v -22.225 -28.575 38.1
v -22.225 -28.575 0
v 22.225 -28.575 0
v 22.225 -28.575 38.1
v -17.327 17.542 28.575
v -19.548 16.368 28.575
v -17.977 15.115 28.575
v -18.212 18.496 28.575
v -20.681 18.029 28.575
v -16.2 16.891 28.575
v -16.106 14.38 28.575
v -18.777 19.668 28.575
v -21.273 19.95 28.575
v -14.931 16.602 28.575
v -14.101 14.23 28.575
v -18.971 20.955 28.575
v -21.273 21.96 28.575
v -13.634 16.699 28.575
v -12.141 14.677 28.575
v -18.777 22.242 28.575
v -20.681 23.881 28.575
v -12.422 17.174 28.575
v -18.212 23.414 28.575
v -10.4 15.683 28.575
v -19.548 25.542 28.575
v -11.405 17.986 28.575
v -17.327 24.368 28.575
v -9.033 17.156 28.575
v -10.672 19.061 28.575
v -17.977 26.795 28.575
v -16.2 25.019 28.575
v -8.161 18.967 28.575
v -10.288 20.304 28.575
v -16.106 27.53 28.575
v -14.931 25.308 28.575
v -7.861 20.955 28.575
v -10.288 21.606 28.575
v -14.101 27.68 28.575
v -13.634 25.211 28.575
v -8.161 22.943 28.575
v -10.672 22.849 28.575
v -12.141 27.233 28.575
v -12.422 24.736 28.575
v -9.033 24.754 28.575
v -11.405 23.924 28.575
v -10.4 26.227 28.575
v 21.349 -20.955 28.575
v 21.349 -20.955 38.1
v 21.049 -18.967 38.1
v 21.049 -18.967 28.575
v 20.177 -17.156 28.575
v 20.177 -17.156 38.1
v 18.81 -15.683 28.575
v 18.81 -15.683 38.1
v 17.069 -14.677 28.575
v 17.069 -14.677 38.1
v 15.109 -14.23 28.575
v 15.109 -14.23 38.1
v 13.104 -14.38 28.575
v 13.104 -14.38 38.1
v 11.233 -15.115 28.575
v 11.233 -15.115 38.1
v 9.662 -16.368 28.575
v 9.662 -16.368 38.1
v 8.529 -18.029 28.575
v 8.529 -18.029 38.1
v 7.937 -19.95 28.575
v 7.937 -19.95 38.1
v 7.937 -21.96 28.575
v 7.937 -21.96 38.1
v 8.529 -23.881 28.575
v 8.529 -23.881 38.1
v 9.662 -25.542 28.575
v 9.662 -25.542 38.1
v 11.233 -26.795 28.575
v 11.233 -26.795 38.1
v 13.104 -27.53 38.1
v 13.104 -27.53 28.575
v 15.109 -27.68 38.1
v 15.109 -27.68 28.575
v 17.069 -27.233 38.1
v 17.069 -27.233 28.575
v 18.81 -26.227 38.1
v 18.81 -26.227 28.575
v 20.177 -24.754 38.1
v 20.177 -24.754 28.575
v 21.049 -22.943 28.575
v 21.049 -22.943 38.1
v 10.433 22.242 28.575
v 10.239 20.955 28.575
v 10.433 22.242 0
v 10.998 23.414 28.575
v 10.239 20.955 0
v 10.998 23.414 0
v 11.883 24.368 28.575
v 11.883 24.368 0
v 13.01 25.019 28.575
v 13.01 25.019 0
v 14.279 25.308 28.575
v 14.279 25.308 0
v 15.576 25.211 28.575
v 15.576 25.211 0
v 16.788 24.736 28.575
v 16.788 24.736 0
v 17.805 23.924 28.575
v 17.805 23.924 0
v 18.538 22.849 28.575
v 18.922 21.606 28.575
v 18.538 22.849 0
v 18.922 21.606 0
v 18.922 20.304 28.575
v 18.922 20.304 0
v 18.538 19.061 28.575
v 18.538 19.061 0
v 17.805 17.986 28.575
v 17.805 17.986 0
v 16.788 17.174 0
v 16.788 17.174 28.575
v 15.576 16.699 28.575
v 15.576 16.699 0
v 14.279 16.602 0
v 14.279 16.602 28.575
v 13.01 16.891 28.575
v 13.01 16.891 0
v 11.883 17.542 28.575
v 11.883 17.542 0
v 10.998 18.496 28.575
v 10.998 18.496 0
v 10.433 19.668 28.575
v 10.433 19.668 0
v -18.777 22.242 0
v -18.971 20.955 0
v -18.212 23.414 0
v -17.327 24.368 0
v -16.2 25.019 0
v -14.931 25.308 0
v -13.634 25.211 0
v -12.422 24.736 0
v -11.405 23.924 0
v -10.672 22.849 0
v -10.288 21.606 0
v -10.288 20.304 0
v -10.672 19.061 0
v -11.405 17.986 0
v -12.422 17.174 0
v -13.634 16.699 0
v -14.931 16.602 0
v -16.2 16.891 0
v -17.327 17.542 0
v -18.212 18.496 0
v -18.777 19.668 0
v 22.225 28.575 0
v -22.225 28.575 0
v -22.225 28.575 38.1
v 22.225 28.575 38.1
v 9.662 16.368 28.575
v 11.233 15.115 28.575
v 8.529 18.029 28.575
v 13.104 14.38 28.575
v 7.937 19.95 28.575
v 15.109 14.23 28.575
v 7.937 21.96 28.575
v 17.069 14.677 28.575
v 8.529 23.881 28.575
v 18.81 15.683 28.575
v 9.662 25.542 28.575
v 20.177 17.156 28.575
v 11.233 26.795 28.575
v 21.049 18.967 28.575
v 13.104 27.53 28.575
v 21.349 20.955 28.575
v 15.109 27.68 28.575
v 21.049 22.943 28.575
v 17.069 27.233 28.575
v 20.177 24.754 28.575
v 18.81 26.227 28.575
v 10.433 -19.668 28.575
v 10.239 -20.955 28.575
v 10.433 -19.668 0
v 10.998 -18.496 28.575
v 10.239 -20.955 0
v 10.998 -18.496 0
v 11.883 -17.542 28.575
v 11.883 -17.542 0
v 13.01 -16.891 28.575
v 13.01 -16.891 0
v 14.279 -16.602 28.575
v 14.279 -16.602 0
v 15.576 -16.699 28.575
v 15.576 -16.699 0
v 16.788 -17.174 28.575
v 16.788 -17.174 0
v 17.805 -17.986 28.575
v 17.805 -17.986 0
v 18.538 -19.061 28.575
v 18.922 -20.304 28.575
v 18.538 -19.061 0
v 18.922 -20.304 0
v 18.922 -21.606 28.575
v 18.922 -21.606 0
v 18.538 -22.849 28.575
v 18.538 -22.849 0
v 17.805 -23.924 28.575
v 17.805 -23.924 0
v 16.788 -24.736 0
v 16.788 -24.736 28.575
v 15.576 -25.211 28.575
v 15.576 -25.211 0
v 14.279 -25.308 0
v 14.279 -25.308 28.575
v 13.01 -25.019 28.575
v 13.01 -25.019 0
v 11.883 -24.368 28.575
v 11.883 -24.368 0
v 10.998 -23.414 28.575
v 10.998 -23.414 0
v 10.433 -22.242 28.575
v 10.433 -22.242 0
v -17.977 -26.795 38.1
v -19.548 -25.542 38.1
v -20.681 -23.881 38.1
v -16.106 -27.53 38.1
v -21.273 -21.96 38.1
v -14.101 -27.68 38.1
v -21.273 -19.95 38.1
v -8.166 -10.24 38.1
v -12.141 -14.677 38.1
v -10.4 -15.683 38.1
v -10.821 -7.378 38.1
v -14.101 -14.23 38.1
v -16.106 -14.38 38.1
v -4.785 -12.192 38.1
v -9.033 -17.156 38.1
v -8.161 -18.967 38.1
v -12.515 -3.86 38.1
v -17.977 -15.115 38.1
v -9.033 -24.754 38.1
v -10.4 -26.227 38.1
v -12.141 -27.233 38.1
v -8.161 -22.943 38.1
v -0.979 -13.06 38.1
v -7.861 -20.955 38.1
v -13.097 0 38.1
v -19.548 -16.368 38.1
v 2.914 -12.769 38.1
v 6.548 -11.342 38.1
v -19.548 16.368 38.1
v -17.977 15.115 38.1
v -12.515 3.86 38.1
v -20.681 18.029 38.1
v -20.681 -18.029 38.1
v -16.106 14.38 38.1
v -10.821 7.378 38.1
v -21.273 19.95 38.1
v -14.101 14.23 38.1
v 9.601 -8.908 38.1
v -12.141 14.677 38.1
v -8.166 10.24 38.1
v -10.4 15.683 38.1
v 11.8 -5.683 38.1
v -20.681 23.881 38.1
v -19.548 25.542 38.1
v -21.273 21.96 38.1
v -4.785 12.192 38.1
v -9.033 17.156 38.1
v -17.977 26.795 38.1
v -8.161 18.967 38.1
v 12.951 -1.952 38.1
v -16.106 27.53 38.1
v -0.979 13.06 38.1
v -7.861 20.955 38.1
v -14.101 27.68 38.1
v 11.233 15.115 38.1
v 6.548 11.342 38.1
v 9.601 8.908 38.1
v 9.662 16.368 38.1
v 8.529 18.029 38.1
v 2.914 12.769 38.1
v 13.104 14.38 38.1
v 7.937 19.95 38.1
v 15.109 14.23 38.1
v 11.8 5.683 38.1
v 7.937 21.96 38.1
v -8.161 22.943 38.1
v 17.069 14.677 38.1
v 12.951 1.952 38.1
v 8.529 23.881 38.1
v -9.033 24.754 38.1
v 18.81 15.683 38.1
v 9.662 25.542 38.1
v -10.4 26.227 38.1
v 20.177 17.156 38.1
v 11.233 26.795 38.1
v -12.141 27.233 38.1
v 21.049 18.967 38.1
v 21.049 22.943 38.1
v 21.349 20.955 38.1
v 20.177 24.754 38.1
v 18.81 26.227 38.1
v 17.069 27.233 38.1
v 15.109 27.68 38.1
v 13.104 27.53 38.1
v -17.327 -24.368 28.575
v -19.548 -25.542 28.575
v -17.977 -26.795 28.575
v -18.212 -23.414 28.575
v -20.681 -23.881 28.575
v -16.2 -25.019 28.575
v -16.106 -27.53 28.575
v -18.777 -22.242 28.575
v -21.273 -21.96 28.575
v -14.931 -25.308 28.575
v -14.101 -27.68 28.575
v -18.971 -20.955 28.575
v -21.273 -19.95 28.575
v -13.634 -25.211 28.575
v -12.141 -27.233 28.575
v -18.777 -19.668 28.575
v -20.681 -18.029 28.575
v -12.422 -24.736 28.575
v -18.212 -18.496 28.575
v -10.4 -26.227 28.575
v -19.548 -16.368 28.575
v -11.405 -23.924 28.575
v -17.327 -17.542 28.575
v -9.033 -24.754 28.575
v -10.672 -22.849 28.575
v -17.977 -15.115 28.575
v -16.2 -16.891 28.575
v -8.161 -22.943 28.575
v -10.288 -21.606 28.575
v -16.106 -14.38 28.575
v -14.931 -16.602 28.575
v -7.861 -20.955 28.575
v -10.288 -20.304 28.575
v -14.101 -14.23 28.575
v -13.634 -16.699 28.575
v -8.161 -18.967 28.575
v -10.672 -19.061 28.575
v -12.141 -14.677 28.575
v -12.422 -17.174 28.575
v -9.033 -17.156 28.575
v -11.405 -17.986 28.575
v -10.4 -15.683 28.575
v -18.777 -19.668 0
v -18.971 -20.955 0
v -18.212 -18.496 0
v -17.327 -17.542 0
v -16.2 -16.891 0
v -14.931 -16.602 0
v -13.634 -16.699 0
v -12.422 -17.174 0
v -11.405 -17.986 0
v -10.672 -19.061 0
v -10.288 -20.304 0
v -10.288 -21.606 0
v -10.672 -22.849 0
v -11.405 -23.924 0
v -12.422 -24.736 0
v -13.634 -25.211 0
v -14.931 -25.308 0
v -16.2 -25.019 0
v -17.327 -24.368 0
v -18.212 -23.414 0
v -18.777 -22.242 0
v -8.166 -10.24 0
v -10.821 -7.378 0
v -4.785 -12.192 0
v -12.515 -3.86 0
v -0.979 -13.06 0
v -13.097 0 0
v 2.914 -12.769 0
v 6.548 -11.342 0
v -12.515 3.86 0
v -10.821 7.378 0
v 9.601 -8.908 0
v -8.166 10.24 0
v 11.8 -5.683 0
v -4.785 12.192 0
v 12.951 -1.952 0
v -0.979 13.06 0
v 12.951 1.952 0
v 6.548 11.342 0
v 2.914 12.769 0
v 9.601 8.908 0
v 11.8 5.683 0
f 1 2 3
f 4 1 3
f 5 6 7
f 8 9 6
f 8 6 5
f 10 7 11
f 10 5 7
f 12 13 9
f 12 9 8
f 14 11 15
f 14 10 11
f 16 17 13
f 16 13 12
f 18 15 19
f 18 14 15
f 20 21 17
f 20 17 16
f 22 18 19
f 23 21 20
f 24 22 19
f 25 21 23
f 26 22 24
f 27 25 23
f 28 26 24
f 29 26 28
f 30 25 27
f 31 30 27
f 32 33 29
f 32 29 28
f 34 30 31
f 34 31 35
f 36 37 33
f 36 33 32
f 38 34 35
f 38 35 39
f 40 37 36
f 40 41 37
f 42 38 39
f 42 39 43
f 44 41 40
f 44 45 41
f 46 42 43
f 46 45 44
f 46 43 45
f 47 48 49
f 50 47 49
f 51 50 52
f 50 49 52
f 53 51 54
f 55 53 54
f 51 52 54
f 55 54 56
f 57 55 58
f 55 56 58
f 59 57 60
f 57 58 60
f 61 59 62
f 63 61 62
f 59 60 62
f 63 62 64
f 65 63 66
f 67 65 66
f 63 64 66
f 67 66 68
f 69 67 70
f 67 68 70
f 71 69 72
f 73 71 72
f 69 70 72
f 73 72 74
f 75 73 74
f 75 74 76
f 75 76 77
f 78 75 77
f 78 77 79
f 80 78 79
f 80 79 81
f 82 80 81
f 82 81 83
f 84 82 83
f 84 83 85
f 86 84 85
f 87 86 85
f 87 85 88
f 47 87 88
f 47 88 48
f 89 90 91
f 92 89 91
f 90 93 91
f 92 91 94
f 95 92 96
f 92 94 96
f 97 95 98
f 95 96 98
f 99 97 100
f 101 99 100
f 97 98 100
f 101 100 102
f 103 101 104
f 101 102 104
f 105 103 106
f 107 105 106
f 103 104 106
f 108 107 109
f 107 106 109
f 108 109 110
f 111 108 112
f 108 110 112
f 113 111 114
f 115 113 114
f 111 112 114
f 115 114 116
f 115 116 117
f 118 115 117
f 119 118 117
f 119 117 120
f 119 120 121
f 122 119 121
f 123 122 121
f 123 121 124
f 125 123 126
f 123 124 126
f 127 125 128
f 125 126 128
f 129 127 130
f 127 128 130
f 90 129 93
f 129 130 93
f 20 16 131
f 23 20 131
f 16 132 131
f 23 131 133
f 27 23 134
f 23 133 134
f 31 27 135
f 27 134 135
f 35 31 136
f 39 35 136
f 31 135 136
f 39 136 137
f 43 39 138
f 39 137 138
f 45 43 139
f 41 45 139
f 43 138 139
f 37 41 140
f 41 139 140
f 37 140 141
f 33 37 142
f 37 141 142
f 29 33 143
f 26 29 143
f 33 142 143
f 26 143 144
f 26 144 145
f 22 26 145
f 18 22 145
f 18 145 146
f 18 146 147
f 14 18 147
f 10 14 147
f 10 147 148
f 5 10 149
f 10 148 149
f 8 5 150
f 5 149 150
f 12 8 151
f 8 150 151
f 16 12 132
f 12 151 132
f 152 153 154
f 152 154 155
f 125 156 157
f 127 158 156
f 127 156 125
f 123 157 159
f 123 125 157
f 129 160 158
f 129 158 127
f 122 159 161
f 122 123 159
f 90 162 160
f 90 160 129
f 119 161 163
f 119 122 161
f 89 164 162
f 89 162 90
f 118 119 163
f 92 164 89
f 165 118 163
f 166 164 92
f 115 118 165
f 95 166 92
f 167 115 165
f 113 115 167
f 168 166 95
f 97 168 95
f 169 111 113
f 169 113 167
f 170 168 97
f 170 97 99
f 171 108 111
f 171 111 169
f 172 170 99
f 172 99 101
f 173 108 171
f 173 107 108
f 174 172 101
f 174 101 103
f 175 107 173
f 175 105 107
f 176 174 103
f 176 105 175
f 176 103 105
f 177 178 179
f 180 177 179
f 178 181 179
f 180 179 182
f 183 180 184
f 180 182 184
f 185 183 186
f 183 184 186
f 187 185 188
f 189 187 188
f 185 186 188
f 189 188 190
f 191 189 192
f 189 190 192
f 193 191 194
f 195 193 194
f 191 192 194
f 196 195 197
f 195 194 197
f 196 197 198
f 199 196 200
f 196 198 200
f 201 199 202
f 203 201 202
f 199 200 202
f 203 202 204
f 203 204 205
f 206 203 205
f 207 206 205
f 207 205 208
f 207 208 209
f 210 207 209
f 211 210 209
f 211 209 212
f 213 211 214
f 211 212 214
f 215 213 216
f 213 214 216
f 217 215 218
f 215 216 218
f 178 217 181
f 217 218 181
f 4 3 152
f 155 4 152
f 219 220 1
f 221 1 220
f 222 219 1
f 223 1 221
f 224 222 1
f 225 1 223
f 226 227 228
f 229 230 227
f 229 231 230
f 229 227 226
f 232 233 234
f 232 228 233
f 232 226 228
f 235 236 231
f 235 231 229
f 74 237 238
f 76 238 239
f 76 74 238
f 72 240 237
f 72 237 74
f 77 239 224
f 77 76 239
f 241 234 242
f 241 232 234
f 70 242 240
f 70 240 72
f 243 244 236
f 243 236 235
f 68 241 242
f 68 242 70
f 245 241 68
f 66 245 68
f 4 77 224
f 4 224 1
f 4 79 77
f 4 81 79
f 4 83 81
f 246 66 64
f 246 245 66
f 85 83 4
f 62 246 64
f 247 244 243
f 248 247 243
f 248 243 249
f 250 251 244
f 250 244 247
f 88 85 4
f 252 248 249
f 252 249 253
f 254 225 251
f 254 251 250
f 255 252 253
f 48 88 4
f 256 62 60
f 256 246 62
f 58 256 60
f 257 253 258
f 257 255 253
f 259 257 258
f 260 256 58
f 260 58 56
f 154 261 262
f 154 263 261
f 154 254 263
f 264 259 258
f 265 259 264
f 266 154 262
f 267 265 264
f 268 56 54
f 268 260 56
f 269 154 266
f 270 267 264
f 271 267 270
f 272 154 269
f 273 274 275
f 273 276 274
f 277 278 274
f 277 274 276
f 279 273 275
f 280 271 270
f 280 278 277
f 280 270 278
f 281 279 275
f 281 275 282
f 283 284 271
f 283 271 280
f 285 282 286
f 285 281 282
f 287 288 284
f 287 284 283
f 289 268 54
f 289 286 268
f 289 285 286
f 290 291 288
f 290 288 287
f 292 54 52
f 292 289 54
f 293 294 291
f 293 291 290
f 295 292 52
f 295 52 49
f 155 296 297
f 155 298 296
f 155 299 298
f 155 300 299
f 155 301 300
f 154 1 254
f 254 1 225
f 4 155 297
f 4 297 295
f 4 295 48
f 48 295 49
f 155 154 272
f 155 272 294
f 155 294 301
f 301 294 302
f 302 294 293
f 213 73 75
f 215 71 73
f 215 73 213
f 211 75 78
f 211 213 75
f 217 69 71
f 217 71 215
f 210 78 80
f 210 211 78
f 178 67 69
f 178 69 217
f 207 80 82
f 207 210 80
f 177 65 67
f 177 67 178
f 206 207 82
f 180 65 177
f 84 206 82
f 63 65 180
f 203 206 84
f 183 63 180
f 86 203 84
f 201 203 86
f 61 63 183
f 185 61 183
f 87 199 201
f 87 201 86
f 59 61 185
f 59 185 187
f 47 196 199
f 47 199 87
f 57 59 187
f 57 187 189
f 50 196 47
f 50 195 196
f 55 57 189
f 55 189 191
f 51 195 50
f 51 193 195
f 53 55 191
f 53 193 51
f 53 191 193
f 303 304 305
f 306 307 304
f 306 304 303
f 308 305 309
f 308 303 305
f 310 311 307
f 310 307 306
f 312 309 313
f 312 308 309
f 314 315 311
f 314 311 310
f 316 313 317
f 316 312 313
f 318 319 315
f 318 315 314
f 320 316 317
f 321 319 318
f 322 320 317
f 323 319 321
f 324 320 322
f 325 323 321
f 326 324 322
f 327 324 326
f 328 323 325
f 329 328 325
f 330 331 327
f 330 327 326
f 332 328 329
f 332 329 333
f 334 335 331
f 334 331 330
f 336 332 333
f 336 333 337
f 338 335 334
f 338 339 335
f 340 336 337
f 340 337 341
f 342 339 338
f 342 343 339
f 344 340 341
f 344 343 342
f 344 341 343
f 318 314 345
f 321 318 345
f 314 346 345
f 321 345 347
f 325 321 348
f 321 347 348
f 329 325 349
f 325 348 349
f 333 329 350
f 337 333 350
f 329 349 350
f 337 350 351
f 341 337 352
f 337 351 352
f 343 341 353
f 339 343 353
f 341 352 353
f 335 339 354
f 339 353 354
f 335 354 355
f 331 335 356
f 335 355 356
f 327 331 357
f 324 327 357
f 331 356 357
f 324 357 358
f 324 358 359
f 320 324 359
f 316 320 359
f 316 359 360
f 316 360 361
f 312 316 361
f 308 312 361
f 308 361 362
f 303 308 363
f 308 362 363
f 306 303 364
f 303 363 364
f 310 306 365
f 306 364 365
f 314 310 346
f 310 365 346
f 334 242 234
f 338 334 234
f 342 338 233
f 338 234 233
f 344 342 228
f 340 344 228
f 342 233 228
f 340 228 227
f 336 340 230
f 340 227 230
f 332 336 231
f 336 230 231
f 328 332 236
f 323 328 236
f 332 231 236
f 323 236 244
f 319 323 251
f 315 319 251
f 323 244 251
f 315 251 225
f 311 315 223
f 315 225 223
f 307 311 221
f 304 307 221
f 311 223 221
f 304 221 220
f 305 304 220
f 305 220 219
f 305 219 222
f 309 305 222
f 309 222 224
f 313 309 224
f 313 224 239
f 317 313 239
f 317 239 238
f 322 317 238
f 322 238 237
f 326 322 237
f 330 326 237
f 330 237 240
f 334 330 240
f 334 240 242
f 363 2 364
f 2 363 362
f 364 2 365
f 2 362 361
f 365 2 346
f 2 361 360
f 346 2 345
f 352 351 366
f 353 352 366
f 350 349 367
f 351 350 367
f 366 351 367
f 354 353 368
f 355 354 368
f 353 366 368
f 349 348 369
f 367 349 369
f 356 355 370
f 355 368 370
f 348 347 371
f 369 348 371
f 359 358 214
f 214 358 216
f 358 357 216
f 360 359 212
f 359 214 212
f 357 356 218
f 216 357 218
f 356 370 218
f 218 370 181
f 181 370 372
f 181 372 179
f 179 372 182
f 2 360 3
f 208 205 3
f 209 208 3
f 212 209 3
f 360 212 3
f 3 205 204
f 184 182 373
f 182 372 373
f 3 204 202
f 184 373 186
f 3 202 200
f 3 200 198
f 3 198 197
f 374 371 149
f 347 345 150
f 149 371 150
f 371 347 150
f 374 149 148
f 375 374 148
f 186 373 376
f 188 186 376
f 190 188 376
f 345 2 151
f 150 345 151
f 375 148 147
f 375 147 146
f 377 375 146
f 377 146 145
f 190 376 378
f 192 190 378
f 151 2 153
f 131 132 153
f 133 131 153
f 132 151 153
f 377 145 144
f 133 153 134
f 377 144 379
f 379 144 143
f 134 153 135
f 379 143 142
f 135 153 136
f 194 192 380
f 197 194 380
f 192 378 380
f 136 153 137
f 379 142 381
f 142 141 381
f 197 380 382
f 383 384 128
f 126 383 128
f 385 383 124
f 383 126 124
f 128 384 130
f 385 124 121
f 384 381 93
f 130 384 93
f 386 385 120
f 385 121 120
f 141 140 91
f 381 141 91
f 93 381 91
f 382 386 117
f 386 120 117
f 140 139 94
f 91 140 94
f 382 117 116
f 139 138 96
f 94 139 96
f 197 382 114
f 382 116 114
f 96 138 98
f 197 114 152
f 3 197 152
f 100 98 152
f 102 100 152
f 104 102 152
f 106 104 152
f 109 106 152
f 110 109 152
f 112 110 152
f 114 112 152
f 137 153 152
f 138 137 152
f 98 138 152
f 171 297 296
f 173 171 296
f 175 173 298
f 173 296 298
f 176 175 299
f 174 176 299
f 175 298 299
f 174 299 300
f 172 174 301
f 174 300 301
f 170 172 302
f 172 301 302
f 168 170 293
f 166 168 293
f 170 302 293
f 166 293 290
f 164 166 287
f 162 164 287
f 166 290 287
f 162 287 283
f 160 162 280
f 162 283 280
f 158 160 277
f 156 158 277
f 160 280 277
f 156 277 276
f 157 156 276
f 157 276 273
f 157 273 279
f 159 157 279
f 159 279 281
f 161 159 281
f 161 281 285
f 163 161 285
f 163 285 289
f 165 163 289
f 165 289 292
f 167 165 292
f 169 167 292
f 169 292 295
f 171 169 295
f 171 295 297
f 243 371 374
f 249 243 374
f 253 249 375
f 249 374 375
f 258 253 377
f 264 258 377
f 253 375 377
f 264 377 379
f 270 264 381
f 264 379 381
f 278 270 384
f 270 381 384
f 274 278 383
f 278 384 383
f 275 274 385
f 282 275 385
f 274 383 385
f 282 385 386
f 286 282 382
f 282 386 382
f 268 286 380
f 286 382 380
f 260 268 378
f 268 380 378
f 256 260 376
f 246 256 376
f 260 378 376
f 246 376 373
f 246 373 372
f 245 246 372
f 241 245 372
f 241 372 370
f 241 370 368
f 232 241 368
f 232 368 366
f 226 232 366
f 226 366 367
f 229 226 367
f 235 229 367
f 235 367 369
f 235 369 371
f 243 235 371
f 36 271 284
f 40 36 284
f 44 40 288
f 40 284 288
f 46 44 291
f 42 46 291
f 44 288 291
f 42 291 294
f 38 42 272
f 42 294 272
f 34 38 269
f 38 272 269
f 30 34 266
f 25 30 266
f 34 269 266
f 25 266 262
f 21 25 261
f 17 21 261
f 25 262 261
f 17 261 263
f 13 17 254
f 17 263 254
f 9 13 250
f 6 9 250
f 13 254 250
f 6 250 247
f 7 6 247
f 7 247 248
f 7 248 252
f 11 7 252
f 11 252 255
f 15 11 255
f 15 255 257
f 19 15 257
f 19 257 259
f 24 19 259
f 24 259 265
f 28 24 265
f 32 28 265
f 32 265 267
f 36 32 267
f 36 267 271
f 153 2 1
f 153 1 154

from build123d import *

# Parameters (mm, degrees)
F0_W           = 44.45
F0_H           = 57.15
F1_DEPTH       = 38.1
F4_D           = 26.19375
F6_D           = 8.73125
F6_CBORE_D     = 13.4874
F6_CBORE_DEPTH = 9.525


with BuildPart() as f1:
    # F0 (on Top) → F1 (new body)
    with BuildSketch(Plane.XY):
        Rectangle(F0_W, F0_H)
    extrude(amount=F1_DEPTH)

    # F4 (through all)
    with Locations(Plane.XY.offset(38.1)):
        with Locations((0, 0)):
            Hole(F4_D / 2)

    # F6 (through all)
    with Locations(Plane.XY.offset(38.1)):
        with Locations((-14.605, 20.955), (14.605, 20.955), (14.605, -20.955), (-14.605, -20.955)):
            CounterBoreHole(F6_D / 2, F6_CBORE_D / 2, F6_CBORE_DEPTH)


solid = f1.part
